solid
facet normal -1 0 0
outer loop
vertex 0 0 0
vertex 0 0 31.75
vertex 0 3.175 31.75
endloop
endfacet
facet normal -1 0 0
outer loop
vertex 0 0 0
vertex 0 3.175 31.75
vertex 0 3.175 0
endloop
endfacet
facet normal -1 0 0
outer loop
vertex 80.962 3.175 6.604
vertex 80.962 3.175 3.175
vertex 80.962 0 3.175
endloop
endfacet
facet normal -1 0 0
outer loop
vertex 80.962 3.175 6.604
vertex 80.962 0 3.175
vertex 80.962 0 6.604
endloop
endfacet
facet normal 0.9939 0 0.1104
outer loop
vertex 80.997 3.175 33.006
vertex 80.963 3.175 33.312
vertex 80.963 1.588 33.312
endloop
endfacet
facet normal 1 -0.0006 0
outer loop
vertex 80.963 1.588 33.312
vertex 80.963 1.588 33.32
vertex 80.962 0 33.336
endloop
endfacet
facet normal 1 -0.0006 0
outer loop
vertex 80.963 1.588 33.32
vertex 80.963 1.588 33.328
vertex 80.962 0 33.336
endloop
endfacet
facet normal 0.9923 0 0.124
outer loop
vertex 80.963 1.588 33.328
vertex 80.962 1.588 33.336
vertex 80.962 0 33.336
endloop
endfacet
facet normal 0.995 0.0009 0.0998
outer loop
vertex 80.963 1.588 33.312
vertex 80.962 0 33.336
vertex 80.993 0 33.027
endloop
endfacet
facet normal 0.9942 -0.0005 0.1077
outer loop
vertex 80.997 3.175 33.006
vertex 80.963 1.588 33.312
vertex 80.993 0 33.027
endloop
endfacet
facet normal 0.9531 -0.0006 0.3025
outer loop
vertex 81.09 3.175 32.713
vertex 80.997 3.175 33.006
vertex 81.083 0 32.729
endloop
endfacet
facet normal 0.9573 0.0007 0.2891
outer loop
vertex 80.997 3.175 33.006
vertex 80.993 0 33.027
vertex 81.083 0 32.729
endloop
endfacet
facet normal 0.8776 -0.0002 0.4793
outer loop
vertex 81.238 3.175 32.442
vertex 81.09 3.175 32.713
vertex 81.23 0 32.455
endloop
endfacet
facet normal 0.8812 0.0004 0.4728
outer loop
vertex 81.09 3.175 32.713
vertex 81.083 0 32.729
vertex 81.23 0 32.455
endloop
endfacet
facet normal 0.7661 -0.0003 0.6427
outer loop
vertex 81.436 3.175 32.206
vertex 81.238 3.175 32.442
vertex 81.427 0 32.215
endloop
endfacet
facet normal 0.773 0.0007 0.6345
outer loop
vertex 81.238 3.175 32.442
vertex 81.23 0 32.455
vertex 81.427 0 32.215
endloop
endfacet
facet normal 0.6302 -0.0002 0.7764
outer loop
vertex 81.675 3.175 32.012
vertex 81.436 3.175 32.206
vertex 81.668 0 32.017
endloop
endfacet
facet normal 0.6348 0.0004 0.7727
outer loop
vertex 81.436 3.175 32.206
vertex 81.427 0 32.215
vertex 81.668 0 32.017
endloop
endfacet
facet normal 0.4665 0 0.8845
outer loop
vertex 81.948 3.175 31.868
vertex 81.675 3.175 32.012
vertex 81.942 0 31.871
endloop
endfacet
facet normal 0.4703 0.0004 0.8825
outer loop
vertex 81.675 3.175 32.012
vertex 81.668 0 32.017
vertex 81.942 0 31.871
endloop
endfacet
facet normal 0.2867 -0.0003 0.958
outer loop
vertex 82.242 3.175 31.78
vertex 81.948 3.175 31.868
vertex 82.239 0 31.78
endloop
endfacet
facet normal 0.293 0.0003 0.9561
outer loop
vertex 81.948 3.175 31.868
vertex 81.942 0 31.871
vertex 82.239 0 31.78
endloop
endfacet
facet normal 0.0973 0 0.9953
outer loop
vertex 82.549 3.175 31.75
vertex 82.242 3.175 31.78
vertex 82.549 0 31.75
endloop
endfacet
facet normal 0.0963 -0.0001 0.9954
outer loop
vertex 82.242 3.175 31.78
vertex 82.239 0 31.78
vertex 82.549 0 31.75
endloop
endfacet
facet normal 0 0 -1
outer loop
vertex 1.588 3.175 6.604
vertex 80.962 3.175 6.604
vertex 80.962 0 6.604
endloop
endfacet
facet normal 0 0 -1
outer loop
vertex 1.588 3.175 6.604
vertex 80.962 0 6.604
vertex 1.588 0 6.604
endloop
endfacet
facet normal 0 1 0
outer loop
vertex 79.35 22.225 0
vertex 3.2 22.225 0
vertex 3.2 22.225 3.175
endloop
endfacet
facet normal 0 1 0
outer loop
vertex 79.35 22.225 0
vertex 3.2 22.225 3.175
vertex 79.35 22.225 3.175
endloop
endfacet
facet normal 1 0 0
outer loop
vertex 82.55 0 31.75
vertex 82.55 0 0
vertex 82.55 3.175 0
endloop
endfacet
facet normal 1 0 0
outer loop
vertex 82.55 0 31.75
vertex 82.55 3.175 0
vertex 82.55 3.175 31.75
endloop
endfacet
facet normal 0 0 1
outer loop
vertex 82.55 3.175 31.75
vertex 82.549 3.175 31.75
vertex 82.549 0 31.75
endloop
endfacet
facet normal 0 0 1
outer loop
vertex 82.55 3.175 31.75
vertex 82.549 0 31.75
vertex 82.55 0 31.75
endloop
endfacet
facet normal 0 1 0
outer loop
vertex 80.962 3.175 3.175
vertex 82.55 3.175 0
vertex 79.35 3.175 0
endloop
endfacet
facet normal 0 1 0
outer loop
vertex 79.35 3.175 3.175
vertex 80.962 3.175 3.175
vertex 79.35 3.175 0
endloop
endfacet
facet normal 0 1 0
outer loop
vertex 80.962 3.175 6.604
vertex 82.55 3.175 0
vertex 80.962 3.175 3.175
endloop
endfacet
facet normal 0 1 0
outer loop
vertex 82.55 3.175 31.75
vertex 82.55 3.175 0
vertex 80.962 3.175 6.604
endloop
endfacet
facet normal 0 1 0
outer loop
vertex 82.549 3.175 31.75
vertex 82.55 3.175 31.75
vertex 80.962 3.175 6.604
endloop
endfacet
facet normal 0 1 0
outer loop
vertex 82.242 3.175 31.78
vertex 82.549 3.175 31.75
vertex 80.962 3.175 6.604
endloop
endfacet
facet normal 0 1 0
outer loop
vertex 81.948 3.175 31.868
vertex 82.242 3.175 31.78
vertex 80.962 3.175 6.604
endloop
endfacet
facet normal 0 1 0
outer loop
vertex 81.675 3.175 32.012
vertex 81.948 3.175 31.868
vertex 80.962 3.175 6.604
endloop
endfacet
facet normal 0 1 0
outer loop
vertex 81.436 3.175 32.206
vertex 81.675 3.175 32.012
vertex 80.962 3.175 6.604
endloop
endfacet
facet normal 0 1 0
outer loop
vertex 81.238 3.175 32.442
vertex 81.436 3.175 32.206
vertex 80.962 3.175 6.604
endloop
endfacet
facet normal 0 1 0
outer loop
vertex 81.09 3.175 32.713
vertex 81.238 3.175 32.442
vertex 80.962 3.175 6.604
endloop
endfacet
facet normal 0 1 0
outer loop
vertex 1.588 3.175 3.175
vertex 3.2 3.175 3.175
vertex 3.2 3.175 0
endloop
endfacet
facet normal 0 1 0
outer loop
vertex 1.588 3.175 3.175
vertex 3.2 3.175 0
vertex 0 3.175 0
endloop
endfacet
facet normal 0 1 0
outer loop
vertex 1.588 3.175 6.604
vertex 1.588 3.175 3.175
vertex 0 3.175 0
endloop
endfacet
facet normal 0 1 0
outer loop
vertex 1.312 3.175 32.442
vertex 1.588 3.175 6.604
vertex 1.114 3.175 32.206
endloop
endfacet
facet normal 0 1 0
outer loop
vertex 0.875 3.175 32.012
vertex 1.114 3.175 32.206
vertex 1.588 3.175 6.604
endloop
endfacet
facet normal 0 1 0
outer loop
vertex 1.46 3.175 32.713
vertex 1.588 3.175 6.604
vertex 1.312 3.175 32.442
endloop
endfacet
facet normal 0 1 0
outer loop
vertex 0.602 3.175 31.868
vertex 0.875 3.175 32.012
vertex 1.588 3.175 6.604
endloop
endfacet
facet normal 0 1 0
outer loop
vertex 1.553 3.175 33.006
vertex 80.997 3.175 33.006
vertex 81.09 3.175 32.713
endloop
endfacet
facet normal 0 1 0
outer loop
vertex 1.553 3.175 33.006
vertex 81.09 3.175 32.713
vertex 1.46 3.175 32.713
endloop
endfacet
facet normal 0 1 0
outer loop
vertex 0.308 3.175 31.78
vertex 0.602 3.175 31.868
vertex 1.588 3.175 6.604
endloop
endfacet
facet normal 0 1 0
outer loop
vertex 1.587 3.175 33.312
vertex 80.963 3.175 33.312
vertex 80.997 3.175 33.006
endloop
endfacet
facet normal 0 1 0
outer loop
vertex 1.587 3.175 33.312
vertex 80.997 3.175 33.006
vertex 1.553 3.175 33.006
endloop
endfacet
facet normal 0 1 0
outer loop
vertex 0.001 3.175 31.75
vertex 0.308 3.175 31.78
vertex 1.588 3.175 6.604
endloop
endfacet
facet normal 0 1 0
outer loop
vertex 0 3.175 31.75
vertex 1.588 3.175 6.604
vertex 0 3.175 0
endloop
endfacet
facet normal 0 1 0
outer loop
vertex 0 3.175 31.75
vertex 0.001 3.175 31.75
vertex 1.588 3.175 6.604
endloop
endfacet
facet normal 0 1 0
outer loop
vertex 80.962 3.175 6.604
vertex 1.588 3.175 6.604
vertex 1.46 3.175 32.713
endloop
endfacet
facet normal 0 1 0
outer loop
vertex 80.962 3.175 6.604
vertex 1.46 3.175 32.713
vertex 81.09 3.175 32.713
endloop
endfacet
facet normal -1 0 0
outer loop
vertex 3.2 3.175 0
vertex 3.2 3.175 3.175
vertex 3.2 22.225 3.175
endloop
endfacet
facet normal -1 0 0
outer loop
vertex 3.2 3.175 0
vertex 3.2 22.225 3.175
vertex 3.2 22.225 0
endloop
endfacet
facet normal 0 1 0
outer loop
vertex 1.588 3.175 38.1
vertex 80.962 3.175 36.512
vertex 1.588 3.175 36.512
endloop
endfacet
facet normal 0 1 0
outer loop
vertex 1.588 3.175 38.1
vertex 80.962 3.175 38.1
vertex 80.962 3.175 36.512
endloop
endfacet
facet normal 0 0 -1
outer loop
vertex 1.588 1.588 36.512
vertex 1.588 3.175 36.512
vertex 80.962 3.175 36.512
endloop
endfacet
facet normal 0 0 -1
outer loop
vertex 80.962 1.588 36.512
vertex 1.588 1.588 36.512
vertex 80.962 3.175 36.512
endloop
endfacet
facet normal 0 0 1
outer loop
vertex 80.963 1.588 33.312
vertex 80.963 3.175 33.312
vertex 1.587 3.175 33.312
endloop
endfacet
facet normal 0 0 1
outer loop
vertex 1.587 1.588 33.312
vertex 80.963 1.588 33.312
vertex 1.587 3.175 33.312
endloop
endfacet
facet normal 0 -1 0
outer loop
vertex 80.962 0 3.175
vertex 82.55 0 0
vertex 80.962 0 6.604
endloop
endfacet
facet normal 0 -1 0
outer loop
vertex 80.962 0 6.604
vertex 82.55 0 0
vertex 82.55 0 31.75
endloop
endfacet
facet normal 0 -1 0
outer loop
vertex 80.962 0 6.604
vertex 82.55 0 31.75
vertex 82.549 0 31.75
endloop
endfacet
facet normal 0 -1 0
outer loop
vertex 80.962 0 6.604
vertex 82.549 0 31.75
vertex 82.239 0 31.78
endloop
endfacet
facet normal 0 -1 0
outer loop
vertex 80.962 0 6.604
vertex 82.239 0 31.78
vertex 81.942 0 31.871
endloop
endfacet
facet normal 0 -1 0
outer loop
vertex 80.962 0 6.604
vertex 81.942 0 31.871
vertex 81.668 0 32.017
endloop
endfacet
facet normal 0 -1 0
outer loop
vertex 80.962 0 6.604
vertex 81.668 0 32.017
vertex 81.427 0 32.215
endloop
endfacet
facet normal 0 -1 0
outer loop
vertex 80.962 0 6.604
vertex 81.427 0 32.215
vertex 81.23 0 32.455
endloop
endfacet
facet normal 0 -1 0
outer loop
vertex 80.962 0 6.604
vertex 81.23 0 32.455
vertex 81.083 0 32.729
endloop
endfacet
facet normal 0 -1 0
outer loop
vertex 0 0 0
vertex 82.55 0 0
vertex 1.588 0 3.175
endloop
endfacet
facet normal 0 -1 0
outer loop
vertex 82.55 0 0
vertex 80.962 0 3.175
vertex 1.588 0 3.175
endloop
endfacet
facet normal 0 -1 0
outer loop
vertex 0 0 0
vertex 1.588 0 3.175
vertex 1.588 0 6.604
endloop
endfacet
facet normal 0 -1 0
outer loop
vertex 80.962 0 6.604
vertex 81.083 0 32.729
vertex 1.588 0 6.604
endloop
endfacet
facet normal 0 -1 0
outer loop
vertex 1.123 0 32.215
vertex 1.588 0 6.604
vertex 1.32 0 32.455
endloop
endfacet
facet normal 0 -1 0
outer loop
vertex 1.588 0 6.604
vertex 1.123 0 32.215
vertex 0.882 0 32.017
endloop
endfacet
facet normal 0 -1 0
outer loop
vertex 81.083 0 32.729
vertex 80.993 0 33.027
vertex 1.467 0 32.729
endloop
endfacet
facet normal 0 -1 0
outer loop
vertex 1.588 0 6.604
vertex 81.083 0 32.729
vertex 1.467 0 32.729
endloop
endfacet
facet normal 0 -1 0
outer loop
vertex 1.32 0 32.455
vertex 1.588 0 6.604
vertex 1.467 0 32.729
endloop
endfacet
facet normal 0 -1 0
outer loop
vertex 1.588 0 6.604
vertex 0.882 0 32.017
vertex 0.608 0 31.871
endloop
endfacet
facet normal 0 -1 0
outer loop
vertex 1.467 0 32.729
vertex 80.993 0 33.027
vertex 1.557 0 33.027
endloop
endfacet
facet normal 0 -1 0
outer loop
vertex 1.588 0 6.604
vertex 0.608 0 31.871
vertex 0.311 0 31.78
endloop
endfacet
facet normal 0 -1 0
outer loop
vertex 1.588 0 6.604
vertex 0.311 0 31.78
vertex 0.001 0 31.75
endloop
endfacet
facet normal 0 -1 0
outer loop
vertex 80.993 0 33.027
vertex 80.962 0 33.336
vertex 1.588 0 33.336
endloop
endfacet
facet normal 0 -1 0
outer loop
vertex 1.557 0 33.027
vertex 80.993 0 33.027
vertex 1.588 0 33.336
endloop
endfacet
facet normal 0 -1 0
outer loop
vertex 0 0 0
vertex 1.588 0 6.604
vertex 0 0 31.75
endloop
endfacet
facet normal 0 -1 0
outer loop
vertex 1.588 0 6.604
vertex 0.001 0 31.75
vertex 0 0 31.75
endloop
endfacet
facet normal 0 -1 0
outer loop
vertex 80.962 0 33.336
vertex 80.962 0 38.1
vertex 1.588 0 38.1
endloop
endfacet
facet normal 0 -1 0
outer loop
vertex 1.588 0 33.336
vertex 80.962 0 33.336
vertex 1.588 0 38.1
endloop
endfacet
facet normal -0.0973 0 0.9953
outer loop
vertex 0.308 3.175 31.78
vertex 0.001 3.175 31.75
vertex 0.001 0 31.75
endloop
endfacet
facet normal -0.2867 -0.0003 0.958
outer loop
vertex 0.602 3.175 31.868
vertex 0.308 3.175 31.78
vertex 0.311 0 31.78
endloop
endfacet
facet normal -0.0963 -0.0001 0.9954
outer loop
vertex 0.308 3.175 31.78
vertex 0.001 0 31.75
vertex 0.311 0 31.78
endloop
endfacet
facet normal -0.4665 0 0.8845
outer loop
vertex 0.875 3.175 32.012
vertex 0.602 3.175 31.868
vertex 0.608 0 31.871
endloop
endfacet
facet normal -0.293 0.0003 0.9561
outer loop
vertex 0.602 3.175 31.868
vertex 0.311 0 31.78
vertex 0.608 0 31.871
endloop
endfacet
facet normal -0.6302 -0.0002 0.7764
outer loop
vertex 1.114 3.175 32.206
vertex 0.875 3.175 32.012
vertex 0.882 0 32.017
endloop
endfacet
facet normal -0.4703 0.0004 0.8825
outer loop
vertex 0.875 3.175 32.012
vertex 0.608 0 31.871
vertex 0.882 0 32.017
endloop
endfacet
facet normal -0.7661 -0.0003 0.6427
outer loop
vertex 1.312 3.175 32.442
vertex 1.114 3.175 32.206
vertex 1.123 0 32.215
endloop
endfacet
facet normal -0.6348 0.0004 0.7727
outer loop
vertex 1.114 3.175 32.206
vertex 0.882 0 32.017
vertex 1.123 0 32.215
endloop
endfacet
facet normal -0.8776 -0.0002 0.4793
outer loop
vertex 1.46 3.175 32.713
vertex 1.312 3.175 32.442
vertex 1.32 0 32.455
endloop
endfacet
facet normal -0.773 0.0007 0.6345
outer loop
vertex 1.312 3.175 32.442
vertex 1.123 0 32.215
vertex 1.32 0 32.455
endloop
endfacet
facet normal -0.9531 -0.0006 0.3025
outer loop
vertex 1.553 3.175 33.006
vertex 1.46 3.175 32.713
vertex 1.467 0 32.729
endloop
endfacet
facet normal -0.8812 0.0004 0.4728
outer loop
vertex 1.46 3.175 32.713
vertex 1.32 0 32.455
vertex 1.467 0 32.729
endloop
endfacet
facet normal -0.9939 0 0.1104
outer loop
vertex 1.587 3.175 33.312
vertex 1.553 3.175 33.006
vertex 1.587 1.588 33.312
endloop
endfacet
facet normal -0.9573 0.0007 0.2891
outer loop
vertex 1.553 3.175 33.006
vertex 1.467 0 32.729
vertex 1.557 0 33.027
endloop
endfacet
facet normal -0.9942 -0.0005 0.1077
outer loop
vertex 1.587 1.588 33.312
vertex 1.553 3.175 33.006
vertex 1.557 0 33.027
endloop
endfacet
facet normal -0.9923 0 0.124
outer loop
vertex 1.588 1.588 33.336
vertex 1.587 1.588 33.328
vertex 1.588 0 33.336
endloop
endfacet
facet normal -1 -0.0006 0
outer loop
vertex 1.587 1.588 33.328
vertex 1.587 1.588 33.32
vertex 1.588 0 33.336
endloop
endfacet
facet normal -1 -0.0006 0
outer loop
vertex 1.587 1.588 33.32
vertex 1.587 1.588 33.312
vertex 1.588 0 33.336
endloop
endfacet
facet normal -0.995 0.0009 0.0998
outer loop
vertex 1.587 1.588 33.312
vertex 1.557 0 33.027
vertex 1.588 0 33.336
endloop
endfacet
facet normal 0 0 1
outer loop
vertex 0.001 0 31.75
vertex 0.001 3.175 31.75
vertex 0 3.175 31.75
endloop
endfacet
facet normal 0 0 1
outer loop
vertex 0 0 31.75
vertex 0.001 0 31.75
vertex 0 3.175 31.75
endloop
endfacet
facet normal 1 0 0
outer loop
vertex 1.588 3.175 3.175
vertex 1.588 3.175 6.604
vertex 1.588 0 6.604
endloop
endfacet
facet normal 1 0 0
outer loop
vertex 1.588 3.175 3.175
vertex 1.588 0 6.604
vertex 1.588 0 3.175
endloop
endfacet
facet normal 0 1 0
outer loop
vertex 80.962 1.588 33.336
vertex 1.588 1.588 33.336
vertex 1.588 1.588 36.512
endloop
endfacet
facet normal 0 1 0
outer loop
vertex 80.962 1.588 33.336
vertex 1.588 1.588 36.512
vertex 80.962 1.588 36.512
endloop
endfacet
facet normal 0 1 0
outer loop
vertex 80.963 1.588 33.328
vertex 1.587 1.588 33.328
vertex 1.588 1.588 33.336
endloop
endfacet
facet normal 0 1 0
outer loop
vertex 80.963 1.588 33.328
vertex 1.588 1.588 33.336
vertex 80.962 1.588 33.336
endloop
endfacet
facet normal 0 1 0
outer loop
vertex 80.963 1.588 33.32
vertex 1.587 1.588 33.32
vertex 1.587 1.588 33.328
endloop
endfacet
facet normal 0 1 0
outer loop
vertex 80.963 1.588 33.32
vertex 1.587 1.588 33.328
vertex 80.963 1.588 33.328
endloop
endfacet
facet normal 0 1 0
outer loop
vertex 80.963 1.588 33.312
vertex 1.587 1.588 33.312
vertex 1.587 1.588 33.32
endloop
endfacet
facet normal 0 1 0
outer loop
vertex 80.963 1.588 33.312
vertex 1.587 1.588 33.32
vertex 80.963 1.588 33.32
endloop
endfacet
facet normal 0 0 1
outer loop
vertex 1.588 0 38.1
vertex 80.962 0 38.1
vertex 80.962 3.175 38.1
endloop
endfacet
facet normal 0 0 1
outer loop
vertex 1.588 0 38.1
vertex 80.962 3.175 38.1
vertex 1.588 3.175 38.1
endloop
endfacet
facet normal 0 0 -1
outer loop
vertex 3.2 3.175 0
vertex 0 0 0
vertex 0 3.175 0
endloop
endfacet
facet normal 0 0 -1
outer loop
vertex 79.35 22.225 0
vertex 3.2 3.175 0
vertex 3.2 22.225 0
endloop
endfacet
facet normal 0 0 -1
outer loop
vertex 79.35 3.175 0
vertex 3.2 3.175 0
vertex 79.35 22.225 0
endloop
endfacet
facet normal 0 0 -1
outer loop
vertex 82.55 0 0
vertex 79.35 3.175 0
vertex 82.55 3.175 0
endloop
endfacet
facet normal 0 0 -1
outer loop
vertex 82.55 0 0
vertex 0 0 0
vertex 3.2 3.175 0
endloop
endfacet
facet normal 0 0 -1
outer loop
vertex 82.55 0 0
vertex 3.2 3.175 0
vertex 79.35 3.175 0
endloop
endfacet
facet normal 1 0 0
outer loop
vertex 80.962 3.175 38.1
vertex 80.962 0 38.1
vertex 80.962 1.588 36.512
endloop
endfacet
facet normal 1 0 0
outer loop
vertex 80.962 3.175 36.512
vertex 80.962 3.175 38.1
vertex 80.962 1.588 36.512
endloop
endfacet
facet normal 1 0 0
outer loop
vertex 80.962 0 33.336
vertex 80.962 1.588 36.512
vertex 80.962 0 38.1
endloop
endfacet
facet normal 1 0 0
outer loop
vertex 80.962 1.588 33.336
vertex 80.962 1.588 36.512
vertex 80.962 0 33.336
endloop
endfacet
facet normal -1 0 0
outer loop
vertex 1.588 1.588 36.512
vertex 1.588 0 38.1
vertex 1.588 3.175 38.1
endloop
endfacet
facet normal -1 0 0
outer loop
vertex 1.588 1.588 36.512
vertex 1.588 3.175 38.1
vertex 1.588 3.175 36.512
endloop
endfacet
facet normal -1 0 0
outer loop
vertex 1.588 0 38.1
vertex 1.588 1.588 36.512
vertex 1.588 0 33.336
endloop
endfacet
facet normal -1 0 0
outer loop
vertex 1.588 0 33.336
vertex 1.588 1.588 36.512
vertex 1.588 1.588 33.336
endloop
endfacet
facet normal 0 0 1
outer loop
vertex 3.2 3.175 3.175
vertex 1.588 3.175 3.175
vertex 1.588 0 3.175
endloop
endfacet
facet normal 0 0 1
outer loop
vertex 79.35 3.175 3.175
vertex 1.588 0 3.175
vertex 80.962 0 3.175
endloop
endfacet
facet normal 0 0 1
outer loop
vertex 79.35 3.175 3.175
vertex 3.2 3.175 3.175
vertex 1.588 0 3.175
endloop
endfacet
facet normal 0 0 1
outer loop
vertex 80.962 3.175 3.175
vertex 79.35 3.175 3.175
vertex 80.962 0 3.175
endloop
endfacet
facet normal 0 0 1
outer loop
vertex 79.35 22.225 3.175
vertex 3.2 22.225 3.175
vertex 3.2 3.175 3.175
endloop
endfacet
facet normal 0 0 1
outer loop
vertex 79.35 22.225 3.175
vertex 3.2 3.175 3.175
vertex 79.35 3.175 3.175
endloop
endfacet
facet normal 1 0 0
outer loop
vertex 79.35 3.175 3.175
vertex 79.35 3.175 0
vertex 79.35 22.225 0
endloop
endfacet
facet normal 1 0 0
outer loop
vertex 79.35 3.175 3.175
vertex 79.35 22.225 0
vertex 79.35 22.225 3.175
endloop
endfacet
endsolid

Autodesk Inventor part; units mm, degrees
ref_plane "YZ Plane" through (0, 0, 0) normal (1, 0, 0) x (0, 1, 0)
ref_plane "XZ Plane" through (0, 0, 0) normal (0, 1, 0) x (-1, 0, 0)
ref_plane "XY Plane" through (0, 0, 0) normal (0, 0, 1) x (1, 0, 0)
sketch "Sketch1" plane through (0, 0, 0) normal (0, 1, 0) x (-1, 0, 0)
  line L0 (0, 0) -> (-82.55, 0)
  line L1 (-82.55, 0) -> (-82.55, 38.1)
  line L2 (-82.55, 38.1) -> (0, 38.1)
  line L3 (0, 38.1) -> (0, 0)
  dimension "d0" = 82.55
  dimension "d1" = 38.1
extrude "Extrusion1" add sketch "Sketch1" along normal blind 3.175
sketch "Sketch2" plane through (0, 3.175, 0) normal (0, 1, 0) x (1, 0, 0)
  line L0 (82.55, 0) -> (0, 0) projected
  line L1 (0, 0) -> (0, -38.1) projected
  line L2 (0, -38.1) -> (82.55, -38.1) projected
  line L3 (82.55, -38.1) -> (82.55, 0) projected
  line L4 (0, -36.5125) -> (82.55, -36.5125)
  line L5 (82.55, -36.5125) -> (82.55, -33.3121)
  line L6 (82.55, -33.3121) -> (0, -33.3121)
  line L7 (0, -33.3121) -> (0, -36.5125)
  line L8 (1.5875, -3.175) -> (87.3125, -3.175)
  line L9 (87.3125, -3.175) -> (87.3125, -6.604)
  line L10 (87.3125, -6.604) -> (1.5875, -6.604)
  line L11 (1.5875, -6.604) -> (1.5875, -3.175)
  dimension "d4" = 3.2004
  dimension "d5" = 1.5875
  dimension "d8" = 85.725
  dimension "d9" = 1.5875
  dimension "d10" = 3.429
  dimension "d11" = 3.175
extrude "Extrusion2" cut sketch "Sketch2" against normal blind 1.5875 contours L6 L3 L4 L1
sketch "Sketch3" plane through (0, 3.175, 0) normal (0, 1, 0) x (1, 0, 0)
  line L0 (82.55, 0) -> (0, 0) projected
  line L1 (0, 0) -> (0, -33.3121) projected
  line L2 (1.5875, -3.175) -> (80.9625, -3.175)
  line L3 (80.9625, -3.175) -> (80.9625, -6.604)
  line L4 (80.9625, -6.604) -> (1.5875, -6.604)
  line L5 (1.5875, -6.604) -> (1.5875, -3.175)
  line L6 (82.55, -33.3121) -> (82.55, 0) projected
  dimension "d15" = 3.429
  dimension "d16" = 3.175
  dimension "d17" = 1.5875
  dimension "d20" = 1.5875
extrude "Extrusion3" cut sketch "Sketch3" against normal blind 12.7
sketch "Sketch4" plane through (0, 3.175, 0) normal (0, 1, 0) x (1, 0, 0)
  line L0 (0, -38.1) -> (1.5875, -38.1)
  line L1 (1.5875, -38.1) -> (1.5875, -31.75)
  line L2 (1.5875, -31.75) -> (0, -31.75)
  line L3 (0, -31.75) -> (0, -38.1)
  line L4 (82.55, -38.1) -> (80.9625, -38.1)
  line L5 (80.9625, -38.1) -> (80.9625, -31.75)
  line L6 (80.9625, -31.75) -> (82.55, -31.75)
  line L7 (82.55, -31.75) -> (82.55, -38.1)
  point P0 (0, 0)
  dimension "d21" = 1.5875
  dimension "d22" = 6.35
  dimension "d23" = 6.35
  dimension "d24" = 1.5875
extrude "Extrusion4" cut sketch "Sketch4" against normal blind 12.7
fillet "Fillet1" radius 1.5875 2 edges at (80.9625, 1.5875, 31.75) (1.5875, 1.5875, 31.75)
sketch "Sketch5" plane through (0, 3.175, 0) normal (0, 1, 0) x (1, 0, 0)
  line L0 (82.55, -31.75) -> (82.55, 0) projected
  line L1 (3.2004, 0) -> (79.3496, 0)
  line L2 (79.3496, 0) -> (79.3496, -3.175)
  line L3 (79.3496, -3.175) -> (3.2004, -3.175)
  line L4 (3.2004, -3.175) -> (3.2004, 0)
  line L5 (0, 0) -> (0, -31.75) projected
  dimension "d31" = 3.175
  dimension "d32" = 3.2004
  dimension "d33" = 3.2004
extrude "Extrusion5" add sketch "Sketch5" along normal blind 19.05
properties part number "Electronics Container Part 5"
